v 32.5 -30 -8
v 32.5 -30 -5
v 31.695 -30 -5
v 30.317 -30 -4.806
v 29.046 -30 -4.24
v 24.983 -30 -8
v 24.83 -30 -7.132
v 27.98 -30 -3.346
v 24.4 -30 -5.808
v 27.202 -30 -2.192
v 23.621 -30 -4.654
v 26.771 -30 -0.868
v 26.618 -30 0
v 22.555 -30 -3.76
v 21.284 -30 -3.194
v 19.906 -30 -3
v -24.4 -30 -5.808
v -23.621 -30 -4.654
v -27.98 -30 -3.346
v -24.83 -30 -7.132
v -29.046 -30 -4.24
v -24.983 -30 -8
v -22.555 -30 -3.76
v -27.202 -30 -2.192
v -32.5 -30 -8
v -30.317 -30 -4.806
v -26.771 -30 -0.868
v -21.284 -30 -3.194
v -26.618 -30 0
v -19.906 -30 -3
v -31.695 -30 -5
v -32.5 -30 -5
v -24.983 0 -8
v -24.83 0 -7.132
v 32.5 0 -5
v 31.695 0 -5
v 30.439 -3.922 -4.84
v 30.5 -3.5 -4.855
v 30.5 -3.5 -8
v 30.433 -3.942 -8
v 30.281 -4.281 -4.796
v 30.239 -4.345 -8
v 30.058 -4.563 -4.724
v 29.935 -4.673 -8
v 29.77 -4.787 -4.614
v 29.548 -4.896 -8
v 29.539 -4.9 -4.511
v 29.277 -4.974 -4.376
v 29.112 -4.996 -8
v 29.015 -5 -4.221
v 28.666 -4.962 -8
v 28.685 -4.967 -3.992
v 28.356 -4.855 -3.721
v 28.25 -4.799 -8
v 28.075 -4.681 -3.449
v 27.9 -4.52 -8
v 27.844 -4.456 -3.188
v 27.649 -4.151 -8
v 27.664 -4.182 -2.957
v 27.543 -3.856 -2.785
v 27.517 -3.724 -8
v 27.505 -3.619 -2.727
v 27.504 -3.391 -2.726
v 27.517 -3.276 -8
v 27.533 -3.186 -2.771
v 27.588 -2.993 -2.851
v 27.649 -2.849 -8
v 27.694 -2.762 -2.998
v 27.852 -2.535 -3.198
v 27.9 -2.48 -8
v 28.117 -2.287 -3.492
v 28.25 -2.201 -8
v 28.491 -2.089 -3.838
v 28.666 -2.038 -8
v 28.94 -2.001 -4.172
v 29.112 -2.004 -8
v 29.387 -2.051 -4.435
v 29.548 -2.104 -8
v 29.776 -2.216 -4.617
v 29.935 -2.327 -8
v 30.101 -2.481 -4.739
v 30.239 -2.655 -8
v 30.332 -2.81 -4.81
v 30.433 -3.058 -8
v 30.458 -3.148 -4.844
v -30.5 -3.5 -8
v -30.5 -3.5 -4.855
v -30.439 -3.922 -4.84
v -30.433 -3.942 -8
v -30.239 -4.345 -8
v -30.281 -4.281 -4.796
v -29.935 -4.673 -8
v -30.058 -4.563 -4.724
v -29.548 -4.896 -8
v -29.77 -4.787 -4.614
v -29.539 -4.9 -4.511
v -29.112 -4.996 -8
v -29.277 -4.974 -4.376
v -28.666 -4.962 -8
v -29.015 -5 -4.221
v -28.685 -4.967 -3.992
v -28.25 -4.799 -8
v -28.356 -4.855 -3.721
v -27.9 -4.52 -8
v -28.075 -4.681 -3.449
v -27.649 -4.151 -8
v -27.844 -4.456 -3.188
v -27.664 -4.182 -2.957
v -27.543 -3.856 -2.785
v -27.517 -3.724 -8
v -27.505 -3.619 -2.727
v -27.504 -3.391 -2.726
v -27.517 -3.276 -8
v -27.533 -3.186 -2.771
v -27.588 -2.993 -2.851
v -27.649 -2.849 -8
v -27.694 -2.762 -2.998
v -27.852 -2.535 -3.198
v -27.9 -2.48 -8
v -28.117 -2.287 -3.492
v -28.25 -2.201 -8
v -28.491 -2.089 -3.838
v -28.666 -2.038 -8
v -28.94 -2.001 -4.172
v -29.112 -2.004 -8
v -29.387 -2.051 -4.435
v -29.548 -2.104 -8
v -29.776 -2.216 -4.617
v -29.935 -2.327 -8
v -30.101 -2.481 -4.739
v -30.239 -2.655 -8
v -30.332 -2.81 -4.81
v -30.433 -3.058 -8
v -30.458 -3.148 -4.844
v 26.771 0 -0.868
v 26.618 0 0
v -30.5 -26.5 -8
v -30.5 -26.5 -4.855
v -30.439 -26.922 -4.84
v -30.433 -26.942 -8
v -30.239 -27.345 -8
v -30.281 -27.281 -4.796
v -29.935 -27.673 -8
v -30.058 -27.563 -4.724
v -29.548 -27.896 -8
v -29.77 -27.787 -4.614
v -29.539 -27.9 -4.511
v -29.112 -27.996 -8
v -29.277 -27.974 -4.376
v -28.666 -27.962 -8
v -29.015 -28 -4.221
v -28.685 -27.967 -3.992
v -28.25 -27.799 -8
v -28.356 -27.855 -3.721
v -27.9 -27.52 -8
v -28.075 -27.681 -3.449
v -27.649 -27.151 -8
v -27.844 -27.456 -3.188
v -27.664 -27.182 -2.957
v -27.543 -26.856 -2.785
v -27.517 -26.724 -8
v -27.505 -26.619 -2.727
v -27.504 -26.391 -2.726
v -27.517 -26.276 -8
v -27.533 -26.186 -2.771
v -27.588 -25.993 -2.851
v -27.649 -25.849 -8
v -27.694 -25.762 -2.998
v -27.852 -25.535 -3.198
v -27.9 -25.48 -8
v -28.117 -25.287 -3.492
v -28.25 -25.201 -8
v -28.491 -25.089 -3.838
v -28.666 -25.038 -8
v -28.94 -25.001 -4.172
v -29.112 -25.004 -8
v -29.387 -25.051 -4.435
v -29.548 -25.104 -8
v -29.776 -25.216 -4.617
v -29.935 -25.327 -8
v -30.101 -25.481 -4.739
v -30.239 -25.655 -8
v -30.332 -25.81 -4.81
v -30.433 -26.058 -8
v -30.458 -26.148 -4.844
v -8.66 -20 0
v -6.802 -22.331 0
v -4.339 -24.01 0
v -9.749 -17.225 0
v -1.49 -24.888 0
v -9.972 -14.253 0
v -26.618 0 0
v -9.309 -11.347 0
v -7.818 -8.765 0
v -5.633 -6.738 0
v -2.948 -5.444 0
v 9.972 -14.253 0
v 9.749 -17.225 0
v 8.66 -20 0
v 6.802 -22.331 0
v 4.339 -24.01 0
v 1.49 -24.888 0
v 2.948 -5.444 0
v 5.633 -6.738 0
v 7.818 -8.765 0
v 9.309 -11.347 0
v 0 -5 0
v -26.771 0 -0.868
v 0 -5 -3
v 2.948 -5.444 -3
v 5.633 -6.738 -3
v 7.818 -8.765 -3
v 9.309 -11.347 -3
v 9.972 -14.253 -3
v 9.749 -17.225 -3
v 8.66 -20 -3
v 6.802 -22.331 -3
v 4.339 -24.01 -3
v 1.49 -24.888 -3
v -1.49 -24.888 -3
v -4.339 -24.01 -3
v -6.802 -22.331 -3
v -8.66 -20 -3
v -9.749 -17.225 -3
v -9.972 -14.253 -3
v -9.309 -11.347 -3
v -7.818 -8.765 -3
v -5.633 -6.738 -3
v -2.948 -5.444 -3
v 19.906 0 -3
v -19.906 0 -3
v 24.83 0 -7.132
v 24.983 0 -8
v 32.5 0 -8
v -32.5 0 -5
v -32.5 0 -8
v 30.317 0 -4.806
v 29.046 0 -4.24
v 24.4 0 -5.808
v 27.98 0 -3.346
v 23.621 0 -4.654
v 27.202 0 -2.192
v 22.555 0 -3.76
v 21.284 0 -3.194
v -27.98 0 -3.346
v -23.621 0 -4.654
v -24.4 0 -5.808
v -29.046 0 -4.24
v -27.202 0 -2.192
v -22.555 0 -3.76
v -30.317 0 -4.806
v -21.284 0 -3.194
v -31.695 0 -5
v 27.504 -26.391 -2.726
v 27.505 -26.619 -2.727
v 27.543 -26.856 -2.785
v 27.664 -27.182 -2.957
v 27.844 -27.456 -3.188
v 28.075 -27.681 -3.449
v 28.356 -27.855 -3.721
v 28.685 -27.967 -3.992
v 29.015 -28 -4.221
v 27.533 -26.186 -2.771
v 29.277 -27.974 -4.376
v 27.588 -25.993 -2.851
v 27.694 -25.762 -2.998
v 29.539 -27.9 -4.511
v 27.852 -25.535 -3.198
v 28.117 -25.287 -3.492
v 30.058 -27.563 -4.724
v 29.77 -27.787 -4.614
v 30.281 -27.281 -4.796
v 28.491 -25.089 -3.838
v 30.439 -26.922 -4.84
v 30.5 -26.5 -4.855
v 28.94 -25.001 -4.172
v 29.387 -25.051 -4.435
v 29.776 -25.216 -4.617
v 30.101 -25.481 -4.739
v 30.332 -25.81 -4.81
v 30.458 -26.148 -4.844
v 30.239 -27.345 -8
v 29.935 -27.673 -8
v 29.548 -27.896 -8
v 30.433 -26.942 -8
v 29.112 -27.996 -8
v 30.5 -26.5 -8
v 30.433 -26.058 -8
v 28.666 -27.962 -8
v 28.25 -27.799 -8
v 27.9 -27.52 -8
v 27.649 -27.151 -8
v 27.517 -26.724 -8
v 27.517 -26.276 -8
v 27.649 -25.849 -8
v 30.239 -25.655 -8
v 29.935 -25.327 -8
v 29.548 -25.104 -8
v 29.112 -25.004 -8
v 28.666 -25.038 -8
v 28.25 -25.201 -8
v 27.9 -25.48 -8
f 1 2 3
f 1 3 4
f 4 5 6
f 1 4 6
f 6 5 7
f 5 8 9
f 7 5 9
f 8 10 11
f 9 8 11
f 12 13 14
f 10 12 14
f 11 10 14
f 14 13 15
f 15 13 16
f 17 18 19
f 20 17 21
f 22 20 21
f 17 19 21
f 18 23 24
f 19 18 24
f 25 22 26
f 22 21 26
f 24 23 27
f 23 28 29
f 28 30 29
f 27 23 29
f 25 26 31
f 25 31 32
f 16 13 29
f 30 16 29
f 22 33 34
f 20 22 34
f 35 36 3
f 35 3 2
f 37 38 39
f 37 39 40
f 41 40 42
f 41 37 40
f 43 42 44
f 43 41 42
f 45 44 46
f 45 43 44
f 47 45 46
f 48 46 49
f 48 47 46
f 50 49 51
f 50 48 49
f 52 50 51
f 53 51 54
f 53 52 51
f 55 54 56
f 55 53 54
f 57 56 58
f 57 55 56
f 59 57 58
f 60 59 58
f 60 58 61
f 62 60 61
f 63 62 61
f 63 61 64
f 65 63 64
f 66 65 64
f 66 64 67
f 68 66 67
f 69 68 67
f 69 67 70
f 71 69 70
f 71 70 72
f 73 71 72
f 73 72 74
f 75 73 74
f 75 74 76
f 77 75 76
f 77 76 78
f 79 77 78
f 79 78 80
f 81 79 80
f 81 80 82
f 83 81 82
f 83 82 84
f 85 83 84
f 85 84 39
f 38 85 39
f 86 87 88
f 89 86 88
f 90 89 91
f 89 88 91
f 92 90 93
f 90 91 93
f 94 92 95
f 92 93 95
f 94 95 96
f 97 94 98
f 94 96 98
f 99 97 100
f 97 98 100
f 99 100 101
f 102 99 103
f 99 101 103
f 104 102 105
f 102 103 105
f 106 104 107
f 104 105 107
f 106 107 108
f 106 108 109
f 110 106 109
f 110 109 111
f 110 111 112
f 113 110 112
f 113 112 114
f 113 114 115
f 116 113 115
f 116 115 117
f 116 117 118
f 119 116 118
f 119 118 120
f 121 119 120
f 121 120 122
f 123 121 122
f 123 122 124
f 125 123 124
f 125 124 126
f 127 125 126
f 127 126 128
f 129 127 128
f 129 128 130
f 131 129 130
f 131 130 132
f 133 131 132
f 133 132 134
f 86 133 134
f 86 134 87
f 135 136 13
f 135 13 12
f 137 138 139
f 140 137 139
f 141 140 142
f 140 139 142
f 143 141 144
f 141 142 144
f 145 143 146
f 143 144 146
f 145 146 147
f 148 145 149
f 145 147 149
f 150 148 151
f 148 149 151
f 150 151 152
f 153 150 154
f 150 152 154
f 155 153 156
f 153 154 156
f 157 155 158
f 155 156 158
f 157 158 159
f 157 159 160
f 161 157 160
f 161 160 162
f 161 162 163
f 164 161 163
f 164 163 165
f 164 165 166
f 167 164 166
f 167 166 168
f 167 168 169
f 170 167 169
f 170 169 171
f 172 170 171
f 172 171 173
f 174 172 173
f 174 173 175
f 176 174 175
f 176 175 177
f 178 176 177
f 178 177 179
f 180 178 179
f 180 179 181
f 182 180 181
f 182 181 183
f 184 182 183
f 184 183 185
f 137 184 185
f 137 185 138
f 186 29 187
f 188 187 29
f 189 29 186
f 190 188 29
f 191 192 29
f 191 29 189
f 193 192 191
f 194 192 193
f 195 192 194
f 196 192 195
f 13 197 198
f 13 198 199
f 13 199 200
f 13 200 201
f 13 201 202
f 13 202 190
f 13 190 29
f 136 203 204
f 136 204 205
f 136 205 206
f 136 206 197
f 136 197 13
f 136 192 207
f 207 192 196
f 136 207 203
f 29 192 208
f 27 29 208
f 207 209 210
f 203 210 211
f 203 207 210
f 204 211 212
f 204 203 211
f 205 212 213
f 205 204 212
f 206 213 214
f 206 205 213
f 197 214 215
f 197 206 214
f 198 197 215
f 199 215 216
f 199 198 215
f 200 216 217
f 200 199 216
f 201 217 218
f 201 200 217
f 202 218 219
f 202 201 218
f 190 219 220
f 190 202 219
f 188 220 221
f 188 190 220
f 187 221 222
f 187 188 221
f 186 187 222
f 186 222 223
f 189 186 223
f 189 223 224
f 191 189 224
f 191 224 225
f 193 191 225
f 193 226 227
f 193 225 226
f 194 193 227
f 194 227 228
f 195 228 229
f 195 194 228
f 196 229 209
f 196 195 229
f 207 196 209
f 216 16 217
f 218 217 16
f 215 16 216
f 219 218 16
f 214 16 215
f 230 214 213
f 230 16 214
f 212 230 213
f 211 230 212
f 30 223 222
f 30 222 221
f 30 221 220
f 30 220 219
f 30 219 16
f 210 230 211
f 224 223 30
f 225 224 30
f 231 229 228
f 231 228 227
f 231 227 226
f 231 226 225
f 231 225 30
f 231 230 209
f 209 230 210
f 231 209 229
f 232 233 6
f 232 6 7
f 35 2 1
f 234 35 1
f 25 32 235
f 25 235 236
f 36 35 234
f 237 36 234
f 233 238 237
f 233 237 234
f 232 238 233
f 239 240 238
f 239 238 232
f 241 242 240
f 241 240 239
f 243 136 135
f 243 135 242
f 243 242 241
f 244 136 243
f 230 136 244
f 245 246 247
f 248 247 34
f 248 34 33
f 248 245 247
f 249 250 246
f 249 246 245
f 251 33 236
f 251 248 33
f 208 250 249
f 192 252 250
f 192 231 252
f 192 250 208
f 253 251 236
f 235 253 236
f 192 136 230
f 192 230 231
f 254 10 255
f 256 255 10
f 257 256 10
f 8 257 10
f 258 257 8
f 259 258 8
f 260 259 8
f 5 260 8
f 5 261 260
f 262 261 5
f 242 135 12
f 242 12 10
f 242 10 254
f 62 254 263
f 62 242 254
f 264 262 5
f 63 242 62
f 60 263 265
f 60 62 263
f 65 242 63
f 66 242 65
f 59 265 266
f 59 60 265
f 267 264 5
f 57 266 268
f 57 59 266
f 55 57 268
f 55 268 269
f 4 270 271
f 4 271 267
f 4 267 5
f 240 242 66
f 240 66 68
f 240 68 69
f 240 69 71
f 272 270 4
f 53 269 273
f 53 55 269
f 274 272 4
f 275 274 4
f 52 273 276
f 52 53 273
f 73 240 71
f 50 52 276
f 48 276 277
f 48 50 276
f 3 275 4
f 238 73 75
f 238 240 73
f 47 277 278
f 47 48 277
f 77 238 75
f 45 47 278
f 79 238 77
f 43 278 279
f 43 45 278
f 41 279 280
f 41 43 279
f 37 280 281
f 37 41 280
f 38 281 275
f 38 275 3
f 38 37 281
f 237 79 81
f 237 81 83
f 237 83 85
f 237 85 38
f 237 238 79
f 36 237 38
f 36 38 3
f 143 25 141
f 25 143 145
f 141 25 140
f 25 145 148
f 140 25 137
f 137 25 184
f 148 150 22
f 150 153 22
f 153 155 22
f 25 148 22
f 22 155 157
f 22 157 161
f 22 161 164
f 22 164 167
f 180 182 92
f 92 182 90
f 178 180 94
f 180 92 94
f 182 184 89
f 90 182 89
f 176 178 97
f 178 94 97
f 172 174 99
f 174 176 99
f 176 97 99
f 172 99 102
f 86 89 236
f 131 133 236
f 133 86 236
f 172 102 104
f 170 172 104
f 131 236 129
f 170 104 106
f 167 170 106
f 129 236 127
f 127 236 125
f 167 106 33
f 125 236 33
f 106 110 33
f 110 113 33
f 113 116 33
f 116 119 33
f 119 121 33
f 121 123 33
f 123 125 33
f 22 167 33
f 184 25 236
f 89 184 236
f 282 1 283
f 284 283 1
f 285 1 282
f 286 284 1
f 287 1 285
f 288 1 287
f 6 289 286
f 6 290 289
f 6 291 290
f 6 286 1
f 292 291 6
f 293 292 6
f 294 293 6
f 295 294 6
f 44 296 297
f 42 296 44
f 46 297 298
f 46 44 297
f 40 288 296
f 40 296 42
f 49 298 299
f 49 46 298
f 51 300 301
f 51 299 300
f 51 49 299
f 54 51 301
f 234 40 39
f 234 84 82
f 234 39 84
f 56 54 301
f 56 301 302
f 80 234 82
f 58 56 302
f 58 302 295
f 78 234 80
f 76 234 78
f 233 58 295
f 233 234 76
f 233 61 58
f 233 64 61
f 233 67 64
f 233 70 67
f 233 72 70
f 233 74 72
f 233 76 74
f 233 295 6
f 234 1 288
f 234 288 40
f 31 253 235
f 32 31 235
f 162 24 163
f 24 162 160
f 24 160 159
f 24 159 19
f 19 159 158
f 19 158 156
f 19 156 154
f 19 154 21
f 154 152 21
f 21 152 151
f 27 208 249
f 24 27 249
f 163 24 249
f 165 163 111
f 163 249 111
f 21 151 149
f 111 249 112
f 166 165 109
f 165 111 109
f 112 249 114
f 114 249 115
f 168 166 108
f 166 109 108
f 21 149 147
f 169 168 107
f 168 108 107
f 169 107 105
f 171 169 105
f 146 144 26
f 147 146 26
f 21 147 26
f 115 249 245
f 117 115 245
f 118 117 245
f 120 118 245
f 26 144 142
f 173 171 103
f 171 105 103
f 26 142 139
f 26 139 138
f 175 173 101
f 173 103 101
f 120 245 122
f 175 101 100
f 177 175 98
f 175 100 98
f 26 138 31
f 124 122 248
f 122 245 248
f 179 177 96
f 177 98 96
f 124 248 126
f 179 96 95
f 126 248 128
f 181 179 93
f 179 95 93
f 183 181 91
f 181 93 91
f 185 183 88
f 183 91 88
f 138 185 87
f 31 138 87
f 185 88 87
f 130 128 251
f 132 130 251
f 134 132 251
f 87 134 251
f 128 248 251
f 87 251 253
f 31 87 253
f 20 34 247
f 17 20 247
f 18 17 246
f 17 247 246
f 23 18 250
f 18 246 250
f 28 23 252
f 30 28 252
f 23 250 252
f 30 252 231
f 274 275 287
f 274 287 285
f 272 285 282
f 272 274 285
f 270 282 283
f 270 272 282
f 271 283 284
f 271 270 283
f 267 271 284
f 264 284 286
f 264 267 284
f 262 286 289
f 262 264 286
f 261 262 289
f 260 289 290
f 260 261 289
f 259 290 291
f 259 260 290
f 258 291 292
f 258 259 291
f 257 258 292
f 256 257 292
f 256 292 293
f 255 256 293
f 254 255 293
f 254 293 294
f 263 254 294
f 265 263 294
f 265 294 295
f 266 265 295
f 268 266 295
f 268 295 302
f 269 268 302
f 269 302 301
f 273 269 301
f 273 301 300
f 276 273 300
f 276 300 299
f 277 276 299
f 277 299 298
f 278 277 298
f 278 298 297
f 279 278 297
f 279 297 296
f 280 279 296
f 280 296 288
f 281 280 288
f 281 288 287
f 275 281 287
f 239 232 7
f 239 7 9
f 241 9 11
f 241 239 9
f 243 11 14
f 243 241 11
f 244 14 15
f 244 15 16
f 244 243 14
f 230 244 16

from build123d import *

# Parameters (mm, degrees)
F1_DEPTH = 30
F3_DEPTH = 8.001
F5_D     = 3


with BuildPart() as f1:
    # F0 (on Front) → F1 (new body)
    with BuildSketch(Plane.XZ):
        with BuildLine():
            Line((0, -3), (0, 0))
            Line((0, 0), (-26.6183650965, 0))
            Line((-26.6183650965, 0), (-26.7714593908, -0.8682408883))
            ThreePointArc((-26.7714593908, -0.8682408883), (-28.4815601075, -3.8302222156), (-31.6954981559, -5))
            Line((-31.6954981559, -5), (-32.5, -5))
            Line((-32.5, -5), (-32.5, -8))
            Line((-32.5, -8), (-24.9827011065, -8))
            Line((-24.9827011065, -8), (-24.8296068121, -7.1317591117))
            ThreePointArc((-24.8296068121, -7.1317591117), (-23.1195060955, -4.1697777844), (-19.905568047, -3))
            Line((-19.905568047, -3), (0, -3))
        make_face()
    extrude(amount=F1_DEPTH)

    # F2 (on face) → F3 (cut, through all)
    with BuildSketch(Plane.XY):
        with BuildLine():
            Line((0, -25), (0, -5))
            ThreePointArc((0, -5), (-10, -15), (0, -25))
        make_face()
        with BuildLine():
            ThreePointArc((0, -25), (7.0710678119, -22.0710678119), (10, -15))
            ThreePointArc((10, -15), (7.0710678119, -7.9289321881), (0, -5))
            Line((0, -5), (0, -25))
        make_face()
    extrude(amount=-F3_DEPTH, mode=Mode.SUBTRACT)

    # F5 (through all)
    with Locations(Plane(origin=(0, 0, -8), x_dir=(1, 0, 0), z_dir=(0, 0, -1))):
        with Locations((-29, 26.5), (-29, 3.5)):
            Hole(F5_D / 2)

    # F6: F1 across plane


with BuildPart() as f1_1:
    add(f1.part)
    add(f1.part.mirror(Plane.YZ))


solid = f1_1.part
